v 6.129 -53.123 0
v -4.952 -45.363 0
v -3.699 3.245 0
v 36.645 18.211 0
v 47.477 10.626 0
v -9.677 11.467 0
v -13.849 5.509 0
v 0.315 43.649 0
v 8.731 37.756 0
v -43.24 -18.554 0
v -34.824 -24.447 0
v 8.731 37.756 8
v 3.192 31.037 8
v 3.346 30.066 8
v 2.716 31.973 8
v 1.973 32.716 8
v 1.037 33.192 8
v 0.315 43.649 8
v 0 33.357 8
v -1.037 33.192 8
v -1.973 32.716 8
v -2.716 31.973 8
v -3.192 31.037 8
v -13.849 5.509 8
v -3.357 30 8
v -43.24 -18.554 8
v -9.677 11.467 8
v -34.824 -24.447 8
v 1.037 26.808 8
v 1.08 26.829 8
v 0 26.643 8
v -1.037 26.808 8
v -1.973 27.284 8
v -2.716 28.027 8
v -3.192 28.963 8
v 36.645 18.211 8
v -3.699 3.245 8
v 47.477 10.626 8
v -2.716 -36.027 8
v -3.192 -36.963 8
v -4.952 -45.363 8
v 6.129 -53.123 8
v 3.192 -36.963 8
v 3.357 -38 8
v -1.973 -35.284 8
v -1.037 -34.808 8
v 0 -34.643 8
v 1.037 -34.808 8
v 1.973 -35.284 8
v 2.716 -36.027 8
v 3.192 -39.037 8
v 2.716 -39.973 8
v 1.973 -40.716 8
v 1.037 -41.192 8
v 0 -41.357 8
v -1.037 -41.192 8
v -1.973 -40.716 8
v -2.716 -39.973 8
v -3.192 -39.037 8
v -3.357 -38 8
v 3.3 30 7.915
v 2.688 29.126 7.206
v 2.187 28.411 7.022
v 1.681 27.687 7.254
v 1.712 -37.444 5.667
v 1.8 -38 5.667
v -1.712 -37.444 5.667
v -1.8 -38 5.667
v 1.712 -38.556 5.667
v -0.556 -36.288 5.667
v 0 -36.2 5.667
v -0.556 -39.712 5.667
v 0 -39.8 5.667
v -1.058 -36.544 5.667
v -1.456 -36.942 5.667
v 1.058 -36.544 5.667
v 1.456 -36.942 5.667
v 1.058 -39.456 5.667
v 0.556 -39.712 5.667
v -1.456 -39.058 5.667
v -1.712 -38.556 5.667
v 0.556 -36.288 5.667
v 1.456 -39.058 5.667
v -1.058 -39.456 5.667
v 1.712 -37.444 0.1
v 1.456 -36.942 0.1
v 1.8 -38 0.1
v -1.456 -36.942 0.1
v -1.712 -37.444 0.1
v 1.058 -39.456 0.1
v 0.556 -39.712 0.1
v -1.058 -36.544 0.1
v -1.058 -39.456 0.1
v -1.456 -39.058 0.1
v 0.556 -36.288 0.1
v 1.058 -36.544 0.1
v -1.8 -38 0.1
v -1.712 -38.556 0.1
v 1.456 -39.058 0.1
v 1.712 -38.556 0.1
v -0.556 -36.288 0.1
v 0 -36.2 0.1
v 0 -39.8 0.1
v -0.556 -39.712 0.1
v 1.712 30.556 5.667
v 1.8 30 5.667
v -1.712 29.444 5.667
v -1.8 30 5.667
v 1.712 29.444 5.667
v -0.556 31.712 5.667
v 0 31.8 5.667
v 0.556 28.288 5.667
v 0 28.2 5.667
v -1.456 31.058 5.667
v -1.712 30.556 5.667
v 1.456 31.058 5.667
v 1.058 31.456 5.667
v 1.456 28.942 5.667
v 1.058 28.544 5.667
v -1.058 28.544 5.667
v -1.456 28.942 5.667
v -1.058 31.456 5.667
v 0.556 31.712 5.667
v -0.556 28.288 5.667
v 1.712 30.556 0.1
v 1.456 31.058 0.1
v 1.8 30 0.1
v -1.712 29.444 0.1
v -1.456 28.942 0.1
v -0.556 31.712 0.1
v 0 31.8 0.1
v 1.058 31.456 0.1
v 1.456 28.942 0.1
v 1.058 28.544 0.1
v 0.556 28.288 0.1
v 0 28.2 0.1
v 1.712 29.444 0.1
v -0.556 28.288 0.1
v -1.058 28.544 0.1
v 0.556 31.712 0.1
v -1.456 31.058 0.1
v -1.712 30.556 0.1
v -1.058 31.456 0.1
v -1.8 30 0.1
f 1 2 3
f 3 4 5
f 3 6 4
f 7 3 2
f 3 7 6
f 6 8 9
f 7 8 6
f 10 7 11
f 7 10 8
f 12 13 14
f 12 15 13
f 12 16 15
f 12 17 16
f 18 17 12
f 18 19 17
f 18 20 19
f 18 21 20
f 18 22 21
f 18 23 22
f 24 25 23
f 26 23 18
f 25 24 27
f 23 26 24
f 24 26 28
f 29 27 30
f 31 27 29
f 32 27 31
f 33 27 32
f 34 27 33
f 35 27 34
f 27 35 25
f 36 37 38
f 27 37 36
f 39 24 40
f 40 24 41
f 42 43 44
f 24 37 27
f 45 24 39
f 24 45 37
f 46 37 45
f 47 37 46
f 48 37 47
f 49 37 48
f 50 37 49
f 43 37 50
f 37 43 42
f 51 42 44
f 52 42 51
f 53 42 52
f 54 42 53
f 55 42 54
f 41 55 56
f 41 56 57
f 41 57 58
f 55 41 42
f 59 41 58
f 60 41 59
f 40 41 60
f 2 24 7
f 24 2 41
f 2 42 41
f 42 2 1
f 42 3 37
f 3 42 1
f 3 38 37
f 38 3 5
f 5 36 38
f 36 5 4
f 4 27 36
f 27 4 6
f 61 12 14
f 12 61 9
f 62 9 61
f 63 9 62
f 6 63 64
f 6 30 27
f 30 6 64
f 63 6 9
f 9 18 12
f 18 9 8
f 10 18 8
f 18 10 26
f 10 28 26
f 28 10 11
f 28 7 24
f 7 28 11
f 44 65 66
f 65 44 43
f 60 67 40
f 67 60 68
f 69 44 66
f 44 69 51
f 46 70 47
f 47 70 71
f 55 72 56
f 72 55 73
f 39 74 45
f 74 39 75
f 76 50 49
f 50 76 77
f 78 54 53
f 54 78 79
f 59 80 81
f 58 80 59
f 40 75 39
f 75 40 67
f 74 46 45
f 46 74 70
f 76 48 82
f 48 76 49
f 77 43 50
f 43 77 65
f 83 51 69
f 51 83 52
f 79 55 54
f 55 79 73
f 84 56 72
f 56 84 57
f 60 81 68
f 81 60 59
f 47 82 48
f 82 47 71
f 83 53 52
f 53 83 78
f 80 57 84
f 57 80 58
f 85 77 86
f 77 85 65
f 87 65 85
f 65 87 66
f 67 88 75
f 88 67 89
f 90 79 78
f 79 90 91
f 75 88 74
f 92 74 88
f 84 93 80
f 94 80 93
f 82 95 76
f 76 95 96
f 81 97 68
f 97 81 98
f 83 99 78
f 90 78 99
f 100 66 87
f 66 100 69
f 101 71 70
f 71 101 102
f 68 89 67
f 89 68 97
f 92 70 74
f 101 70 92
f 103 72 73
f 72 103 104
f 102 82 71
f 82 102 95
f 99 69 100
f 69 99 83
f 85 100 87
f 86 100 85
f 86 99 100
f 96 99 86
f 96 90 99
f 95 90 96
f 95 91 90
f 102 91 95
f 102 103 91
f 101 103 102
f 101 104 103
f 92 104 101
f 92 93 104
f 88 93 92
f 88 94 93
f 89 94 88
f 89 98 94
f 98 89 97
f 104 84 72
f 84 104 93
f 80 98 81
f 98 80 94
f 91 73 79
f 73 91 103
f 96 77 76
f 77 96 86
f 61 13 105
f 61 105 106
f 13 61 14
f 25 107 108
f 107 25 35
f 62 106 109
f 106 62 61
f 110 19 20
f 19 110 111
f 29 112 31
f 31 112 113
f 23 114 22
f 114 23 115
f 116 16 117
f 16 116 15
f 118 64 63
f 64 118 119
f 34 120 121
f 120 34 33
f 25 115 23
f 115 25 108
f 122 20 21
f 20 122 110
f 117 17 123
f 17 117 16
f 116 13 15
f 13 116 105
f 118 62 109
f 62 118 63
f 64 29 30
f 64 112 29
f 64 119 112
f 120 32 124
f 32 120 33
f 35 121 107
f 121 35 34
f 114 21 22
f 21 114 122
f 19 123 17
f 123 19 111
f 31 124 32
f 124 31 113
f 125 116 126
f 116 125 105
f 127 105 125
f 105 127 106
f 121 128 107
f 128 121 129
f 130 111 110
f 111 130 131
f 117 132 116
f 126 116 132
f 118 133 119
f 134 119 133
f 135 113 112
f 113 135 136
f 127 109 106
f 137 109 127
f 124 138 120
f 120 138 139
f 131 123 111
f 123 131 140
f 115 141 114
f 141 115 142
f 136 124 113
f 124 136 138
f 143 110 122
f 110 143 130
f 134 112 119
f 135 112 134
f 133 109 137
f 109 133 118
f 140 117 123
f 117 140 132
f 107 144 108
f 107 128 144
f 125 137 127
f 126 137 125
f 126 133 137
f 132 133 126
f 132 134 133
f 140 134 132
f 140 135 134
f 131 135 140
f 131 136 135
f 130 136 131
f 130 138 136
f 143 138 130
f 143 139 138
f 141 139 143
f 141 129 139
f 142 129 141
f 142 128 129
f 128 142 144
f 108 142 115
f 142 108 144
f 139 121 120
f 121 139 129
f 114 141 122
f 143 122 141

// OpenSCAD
// Street Numbers for 3D printing
// Charles Tilford, 2019
// License: CC BY-NC-SA 4.0
//   https://creativecommons.org/licenses/by-nc-sa/4.0/

char="K";     // The number/letter to print

// Units are in mm, except for height of letter

// How many inches high should letter be?
inchesHigh=3;
// How thick/deep should letter be (mm)?
depth=8;

// Character coordinates just center the letter
charX=-35;    // Character X coord
charY=-40;    // Character Y coord
topScrew=30;  // Top screw Y coord
botScrew=-38; // Bottom screw Y coord
height=8;     // Thickness of character
// Screw dimensions. Default presumes
// #6 sheet metal screw
screwWid=3.6; // Width of screw shaft
screwTop=6.78;// Width of screw head
screwCon=5.08;// Height of head 'cone'

// Font to print in. Your system needs this
// installed, of course. If changed the hole
// positions almost certainly need to be
// changed, and maybe charX/charY.
fName="Open Sans Extrabold";
// https://fonts.google.com/specimen/Open+Sans
// Designer: Steve Matteson

// Thin floor below holes. My printer was
// struggling to have the hole 'border' stick
// to the stage. Just drill/screw thru it.
holeFloor=0.1; 

// ==========================================
// ===== All values below are auto-calculated
// ==========================================

// Scaled values
scaleFactor=inchesHigh / 3;
cX=charX * scaleFactor;
cY=charY * scaleFactor;
tS=topScrew * scaleFactor;
bS=botScrew * scaleFactor;
// Where do we start drawing screw head cone?
oS=depth - (screwCon-.05);

difference() {
  // We use difference() to punch out the screw holes
  // in the character
    
  // The character itself, 8mm thick
  rotate(a=-35)
  translate([cX,cY,0])
    linear_extrude(height=depth, scale=1)
    text(char, size=(75*scaleFactor),
         $fn=100, font=fName);
    
  // Bottom screw hole
  translate([0,bS,oS]) color("red")
    cylinder(h=screwCon, d2=screwTop,
             d1=0, $fn=20);
   translate([0,bS,holeFloor])
    cylinder(h=20, d=screwWid, $fn=20);
    
  // Top screw hole
  translate([0,tS,oS]) color("red")
    cylinder(h=screwCon, d2=screwTop,
             d1=0, $fn=20);
  translate([0,tS,holeFloor])
    cylinder(h=20, d=screwWid, $fn=20);
}

// Colors are just to aid visualization of
// void spaces. $fn is "featuer number", ie how
// many polygons are devoted to object. The values
// above should be near your printing limit anyway.

// Developed in OpenSCAD
//    https://www.openscad.org/
